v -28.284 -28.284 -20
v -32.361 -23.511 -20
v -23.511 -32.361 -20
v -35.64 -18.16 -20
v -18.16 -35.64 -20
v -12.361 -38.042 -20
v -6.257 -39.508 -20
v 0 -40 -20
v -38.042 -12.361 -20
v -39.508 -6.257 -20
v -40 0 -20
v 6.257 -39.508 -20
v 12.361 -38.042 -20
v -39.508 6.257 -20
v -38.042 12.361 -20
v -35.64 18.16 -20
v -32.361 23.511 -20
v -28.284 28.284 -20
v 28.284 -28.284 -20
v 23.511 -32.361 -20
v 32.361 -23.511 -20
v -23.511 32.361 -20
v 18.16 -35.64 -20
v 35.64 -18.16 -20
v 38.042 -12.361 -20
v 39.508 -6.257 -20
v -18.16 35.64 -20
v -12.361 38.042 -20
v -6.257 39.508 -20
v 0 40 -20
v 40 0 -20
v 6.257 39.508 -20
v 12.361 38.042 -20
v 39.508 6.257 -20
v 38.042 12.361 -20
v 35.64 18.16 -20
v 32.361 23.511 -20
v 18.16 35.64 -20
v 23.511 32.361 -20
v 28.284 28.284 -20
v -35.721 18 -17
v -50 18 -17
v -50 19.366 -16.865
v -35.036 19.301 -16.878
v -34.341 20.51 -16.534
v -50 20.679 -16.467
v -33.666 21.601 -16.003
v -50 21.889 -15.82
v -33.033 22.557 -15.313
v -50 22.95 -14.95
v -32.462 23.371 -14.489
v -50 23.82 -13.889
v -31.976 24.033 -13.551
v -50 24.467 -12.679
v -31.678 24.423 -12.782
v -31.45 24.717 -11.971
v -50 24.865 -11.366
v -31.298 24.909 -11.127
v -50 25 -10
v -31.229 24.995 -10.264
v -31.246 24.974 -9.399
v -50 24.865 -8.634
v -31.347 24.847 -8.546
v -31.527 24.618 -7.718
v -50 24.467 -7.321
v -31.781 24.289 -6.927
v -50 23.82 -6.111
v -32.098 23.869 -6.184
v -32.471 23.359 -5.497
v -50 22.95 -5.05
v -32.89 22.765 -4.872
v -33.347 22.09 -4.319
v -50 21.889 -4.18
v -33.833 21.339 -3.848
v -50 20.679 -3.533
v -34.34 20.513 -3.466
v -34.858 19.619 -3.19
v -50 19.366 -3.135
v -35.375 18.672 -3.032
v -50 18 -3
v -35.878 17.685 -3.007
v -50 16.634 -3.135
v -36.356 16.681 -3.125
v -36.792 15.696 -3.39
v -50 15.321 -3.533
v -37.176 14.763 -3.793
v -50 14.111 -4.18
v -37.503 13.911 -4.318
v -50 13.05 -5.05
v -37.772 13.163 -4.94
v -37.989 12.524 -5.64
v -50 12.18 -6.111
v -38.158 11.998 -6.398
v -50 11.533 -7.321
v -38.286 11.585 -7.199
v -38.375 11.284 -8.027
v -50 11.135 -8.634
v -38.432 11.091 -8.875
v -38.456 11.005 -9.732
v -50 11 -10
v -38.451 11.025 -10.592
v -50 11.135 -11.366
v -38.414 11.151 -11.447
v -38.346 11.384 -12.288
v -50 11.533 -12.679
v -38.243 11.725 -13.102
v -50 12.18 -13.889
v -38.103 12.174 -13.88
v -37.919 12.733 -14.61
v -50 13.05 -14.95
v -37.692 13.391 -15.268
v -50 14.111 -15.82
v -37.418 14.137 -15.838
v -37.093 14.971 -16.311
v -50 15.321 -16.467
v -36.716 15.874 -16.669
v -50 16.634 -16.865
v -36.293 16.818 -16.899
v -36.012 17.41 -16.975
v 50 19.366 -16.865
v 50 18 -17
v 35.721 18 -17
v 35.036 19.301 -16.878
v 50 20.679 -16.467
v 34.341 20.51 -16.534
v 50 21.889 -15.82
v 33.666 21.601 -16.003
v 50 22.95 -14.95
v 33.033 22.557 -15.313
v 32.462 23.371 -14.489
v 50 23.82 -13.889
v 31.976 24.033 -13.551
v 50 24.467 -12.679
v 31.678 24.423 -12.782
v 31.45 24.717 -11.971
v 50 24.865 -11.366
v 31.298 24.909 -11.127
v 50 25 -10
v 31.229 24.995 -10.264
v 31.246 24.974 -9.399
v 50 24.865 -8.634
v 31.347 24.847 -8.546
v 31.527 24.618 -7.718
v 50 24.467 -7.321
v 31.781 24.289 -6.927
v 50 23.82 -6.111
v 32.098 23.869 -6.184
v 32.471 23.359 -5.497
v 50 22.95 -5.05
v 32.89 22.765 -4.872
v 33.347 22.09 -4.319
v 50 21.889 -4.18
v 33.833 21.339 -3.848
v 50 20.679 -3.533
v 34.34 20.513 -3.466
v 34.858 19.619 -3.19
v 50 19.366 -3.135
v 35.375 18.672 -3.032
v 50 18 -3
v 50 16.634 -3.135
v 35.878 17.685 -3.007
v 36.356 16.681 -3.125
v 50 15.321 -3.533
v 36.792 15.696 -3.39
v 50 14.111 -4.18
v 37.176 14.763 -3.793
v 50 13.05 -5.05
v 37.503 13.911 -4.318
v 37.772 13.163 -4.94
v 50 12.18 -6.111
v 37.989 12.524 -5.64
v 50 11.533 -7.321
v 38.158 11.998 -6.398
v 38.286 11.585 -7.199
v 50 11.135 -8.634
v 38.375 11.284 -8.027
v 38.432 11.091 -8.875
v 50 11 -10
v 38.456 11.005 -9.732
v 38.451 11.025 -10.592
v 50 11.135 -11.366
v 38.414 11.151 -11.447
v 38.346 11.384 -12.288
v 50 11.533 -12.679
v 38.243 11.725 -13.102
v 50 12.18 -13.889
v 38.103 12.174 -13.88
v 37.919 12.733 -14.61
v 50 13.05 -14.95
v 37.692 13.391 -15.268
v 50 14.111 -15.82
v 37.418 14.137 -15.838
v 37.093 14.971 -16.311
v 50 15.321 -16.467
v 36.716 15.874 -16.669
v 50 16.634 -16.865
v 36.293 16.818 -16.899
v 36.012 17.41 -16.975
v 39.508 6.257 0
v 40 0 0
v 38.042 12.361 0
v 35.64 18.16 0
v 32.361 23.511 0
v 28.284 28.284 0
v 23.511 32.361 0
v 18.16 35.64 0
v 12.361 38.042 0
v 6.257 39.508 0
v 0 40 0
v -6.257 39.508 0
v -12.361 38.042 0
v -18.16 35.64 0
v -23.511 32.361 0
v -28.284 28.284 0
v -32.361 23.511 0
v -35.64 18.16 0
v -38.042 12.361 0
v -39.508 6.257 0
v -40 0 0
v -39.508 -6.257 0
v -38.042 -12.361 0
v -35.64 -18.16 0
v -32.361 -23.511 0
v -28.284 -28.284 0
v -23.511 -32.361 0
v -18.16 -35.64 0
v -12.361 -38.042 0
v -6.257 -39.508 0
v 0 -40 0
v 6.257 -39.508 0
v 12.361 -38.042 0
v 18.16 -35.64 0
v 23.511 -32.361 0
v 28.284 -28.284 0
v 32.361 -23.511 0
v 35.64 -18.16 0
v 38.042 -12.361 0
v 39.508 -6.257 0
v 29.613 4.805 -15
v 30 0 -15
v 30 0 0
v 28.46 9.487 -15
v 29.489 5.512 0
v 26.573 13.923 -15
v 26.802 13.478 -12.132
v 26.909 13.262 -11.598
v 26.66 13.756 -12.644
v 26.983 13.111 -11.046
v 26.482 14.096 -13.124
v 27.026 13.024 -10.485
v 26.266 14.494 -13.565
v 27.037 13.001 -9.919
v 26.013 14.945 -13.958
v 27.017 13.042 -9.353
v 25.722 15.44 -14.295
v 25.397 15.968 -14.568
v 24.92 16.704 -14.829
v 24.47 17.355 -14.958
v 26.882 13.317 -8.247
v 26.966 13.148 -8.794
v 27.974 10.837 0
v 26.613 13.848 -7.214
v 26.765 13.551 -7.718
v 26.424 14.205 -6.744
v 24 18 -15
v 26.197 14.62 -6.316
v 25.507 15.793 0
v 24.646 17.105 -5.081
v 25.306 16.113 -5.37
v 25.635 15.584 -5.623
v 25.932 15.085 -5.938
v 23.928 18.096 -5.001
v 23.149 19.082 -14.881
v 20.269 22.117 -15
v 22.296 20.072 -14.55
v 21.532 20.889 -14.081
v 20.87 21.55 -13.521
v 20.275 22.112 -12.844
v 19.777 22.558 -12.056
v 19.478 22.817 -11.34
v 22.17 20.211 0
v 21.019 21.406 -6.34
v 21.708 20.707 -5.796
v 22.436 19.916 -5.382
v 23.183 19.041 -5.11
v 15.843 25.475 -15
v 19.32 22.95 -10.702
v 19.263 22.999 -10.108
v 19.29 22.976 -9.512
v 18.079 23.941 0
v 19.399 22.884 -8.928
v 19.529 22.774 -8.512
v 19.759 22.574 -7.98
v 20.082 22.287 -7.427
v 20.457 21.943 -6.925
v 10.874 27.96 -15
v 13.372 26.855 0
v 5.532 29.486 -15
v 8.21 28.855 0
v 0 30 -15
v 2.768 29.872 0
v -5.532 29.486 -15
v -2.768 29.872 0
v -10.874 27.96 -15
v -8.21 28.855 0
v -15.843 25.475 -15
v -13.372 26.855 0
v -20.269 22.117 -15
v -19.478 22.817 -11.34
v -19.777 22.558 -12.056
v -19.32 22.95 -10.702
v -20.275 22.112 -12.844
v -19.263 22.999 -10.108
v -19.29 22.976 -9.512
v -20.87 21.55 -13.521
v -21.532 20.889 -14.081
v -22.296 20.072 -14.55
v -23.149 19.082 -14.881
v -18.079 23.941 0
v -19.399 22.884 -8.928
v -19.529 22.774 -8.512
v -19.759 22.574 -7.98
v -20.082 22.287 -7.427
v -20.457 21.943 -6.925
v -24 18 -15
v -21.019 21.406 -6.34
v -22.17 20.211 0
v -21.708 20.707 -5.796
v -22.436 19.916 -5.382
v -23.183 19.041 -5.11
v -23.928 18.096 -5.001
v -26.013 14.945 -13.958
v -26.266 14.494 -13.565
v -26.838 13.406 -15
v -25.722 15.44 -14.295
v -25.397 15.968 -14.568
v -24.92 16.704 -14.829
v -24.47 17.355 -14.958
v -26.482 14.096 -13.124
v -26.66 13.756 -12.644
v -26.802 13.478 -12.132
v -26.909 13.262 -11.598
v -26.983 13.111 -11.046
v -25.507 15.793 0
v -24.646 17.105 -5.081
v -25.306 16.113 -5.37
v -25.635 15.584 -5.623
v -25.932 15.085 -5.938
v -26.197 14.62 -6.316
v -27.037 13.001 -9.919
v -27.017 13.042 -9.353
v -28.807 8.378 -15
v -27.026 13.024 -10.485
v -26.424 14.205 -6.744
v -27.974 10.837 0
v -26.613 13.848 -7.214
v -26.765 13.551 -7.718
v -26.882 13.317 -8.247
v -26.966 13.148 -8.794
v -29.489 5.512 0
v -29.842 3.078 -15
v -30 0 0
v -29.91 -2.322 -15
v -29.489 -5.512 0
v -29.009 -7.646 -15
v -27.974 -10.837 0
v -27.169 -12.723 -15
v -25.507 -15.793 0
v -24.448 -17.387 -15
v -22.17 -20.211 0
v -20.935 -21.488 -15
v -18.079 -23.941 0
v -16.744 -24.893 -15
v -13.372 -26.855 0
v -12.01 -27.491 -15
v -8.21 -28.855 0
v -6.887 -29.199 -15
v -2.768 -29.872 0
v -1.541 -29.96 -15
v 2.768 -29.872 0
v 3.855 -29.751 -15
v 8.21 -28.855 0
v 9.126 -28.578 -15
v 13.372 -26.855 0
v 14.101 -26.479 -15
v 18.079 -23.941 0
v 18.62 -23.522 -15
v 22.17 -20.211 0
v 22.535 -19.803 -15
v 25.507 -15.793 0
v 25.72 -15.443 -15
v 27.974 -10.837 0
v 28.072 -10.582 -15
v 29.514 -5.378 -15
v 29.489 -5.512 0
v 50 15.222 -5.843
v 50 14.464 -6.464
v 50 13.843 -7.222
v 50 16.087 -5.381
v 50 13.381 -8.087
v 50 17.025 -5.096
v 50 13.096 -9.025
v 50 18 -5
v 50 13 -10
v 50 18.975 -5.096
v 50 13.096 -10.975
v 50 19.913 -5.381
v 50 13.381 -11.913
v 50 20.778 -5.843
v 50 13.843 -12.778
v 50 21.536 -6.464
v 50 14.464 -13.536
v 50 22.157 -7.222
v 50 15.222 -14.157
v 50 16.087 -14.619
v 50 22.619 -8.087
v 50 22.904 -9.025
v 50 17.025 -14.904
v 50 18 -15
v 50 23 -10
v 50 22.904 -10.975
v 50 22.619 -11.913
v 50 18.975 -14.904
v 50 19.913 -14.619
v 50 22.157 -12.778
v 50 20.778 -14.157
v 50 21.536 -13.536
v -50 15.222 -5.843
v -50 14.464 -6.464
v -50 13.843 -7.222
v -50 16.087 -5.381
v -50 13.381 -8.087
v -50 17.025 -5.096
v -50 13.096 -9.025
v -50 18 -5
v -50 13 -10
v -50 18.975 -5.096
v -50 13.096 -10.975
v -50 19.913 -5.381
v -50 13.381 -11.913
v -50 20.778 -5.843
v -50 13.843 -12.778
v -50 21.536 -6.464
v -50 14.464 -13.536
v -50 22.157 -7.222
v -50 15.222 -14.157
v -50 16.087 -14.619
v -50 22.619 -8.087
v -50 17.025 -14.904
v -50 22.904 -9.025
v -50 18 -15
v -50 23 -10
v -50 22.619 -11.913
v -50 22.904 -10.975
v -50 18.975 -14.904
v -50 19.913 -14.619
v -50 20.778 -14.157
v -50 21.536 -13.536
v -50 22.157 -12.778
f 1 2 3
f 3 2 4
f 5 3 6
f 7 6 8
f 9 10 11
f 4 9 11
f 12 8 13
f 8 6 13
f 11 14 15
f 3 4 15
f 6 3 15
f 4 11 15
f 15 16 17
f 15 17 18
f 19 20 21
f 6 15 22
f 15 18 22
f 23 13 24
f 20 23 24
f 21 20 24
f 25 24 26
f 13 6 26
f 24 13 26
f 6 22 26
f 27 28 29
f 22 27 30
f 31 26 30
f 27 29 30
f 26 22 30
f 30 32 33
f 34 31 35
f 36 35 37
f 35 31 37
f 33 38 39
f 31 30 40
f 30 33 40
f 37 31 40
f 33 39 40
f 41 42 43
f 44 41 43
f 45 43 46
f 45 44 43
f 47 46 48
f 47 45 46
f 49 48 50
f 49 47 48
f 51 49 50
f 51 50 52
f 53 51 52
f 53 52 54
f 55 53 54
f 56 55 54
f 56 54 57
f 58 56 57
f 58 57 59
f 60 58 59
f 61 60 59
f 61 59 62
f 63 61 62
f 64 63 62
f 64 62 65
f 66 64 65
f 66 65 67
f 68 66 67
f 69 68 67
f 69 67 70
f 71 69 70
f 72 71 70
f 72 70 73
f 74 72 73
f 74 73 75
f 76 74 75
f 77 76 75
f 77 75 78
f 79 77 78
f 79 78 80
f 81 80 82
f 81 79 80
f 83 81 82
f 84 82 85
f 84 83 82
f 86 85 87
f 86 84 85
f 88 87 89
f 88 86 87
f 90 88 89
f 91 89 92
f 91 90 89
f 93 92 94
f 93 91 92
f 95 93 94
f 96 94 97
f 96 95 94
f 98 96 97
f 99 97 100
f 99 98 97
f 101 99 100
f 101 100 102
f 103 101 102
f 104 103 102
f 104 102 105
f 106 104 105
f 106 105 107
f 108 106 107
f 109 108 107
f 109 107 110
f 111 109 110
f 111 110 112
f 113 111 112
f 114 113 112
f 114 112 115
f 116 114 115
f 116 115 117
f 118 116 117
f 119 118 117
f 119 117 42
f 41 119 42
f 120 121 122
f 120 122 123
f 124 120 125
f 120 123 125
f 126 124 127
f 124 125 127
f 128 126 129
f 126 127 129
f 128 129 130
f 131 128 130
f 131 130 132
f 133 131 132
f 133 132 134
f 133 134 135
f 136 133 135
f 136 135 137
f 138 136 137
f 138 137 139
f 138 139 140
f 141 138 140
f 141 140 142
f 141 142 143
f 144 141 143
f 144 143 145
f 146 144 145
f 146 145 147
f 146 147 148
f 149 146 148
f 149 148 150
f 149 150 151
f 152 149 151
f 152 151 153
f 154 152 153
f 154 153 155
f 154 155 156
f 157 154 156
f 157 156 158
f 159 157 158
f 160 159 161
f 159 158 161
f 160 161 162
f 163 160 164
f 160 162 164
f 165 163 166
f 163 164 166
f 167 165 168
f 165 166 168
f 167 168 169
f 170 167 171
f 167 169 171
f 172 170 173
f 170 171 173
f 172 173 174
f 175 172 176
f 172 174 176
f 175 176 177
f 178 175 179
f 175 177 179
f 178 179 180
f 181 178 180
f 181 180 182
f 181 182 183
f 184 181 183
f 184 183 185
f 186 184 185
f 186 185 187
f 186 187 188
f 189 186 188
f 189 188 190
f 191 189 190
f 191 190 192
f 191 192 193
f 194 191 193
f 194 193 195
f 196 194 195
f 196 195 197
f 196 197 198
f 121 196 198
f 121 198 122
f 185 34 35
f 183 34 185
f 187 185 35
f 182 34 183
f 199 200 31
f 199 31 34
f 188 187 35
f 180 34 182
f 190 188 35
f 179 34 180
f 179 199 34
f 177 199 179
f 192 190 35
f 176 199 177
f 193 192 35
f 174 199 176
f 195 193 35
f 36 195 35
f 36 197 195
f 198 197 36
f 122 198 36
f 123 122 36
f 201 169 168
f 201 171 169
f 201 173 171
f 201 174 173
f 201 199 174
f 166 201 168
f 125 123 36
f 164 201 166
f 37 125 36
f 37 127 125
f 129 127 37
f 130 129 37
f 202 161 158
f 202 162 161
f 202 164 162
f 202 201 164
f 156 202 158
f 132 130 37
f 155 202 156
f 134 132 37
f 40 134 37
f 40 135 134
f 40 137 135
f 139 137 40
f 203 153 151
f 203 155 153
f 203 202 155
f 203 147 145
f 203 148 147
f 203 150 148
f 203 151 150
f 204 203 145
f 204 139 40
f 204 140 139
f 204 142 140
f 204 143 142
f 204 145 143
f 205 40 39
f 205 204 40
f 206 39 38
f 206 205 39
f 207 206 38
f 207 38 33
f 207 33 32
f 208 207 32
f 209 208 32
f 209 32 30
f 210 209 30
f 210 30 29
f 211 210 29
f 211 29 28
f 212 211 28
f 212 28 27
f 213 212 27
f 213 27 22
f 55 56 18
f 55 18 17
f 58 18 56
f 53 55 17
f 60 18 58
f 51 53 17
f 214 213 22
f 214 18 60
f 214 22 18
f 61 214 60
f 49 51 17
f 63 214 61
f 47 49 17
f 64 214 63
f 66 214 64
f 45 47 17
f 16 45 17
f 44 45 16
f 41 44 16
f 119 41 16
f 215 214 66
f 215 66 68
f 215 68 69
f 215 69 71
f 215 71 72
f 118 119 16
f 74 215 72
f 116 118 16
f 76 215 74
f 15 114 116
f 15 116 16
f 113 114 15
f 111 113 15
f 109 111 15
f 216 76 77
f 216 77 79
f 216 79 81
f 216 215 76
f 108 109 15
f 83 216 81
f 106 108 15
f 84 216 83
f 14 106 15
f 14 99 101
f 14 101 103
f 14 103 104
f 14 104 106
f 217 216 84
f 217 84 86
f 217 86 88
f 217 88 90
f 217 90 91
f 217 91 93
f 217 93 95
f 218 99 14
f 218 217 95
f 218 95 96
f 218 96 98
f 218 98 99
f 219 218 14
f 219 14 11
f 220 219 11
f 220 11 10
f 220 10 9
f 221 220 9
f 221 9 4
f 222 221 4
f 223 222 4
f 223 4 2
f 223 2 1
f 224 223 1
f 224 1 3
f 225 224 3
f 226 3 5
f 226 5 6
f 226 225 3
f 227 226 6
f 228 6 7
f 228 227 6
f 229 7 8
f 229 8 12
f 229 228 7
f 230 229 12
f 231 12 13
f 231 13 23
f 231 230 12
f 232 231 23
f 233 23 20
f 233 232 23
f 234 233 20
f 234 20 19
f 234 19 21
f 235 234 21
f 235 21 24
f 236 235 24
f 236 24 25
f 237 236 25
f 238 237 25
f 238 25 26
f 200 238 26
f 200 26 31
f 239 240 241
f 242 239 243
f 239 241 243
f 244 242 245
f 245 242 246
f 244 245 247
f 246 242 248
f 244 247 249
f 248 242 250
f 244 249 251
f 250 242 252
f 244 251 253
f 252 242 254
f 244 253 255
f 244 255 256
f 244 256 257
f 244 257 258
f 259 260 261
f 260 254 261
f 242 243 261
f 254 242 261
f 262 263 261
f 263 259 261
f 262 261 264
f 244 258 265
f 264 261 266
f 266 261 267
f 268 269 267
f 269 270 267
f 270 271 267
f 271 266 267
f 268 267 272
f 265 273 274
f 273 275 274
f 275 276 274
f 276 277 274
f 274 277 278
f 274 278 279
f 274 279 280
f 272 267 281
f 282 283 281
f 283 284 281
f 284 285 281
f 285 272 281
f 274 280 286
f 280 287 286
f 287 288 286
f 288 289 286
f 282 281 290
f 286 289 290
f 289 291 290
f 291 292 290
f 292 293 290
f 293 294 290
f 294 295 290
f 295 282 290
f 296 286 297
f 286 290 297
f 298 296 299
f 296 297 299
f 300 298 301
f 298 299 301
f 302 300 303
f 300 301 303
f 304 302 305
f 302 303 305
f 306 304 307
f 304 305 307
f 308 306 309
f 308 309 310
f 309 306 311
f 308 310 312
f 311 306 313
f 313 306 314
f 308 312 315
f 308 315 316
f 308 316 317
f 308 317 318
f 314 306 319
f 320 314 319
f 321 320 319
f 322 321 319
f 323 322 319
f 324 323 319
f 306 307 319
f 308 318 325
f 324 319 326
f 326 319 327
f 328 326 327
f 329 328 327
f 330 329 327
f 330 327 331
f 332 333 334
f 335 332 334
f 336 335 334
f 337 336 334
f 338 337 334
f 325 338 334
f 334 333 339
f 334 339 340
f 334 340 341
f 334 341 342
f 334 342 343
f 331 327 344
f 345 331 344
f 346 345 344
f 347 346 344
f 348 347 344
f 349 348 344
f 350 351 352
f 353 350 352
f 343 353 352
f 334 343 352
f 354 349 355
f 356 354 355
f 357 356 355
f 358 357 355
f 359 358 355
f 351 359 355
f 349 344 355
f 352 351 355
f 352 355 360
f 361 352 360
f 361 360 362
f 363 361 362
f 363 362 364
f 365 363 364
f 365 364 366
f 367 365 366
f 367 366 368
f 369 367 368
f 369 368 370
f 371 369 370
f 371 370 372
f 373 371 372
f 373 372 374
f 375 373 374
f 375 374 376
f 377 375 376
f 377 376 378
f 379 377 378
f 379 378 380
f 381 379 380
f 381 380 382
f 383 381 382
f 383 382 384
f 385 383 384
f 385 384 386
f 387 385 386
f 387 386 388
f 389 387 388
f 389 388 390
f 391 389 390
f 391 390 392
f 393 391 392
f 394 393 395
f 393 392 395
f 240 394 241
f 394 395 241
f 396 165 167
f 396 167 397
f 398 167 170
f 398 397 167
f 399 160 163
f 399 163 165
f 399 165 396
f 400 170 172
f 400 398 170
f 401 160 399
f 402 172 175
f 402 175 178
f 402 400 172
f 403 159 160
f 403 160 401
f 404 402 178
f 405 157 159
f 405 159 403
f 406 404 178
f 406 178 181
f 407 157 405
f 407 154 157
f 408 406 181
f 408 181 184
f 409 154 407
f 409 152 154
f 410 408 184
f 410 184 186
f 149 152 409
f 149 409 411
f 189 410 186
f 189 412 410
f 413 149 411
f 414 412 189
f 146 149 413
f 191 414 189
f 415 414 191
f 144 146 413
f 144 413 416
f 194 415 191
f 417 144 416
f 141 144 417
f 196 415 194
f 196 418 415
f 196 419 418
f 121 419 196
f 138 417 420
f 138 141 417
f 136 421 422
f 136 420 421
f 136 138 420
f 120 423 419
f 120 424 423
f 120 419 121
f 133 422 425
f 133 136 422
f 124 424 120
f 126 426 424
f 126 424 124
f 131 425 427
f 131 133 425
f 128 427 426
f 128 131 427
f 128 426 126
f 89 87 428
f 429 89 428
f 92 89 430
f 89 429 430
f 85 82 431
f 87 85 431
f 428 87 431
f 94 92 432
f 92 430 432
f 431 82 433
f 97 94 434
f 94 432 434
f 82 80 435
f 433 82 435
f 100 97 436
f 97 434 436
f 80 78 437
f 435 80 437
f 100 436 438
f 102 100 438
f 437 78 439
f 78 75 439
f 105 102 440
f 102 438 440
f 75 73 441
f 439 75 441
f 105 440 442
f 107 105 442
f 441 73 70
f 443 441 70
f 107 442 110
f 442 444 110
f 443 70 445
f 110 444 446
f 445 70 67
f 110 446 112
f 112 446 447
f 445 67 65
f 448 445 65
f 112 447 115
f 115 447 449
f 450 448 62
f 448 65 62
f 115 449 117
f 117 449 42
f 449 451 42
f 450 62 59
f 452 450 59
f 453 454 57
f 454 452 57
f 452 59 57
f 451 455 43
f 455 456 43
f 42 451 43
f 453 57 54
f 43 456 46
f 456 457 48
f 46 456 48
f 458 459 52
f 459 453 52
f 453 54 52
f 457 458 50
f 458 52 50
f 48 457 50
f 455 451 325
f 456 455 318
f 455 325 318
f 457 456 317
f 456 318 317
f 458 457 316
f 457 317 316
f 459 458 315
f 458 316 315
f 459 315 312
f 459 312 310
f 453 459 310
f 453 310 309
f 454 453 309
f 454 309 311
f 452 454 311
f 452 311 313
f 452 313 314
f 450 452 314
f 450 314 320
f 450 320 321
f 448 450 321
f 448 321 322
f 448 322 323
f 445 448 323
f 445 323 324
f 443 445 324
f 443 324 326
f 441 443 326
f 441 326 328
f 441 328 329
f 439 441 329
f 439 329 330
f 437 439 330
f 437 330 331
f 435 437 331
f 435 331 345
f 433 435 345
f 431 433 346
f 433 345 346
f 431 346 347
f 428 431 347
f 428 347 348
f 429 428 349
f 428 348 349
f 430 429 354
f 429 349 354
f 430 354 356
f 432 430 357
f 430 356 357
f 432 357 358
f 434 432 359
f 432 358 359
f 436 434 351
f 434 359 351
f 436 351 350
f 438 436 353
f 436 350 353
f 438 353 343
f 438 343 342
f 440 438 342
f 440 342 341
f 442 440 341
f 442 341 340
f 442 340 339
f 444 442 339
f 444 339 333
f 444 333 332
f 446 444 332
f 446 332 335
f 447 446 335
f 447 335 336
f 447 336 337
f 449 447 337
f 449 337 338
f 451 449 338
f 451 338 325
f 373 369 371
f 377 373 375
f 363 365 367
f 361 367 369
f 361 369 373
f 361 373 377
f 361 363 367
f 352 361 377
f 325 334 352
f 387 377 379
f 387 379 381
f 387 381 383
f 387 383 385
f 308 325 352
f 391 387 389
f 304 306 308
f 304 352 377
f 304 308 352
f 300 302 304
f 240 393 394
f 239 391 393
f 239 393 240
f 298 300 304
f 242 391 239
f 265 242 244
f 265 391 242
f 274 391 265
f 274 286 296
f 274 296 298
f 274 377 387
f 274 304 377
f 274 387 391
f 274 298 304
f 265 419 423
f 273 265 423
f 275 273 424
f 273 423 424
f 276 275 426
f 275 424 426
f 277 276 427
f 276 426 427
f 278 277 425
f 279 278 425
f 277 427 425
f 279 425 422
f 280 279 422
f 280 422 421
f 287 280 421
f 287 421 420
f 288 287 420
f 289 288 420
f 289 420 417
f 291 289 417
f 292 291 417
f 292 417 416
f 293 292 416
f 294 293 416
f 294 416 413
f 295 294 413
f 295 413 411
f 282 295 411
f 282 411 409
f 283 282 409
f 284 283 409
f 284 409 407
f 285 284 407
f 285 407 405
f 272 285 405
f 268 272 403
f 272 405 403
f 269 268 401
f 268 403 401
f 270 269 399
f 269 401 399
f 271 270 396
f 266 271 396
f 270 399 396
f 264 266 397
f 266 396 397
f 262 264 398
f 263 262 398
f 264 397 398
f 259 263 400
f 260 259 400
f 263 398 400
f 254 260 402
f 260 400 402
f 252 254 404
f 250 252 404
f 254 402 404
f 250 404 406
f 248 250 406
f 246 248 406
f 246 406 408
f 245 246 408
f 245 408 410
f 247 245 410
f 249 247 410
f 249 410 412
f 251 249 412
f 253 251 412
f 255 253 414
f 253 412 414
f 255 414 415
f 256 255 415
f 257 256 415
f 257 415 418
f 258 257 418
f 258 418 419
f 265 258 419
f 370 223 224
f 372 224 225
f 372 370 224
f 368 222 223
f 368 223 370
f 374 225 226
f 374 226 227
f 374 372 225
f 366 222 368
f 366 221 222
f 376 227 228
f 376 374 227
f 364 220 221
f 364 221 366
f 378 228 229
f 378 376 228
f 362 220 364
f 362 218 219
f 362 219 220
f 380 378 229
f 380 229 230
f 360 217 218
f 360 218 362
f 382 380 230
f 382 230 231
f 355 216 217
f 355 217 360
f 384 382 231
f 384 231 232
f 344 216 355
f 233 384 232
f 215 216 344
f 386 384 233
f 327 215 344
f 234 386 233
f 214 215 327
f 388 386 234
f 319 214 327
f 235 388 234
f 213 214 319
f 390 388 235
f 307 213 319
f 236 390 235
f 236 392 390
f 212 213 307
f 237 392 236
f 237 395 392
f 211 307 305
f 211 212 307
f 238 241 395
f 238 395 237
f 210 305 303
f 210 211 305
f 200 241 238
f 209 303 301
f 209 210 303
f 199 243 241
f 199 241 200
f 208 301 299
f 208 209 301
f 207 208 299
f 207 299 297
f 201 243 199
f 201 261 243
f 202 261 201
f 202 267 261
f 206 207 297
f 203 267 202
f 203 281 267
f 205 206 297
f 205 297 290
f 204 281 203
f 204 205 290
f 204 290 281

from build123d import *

# Parameters (mm, degrees)
SKETCH1_R                = 40
BOSS_EXTRUDE1_DEPTH      = 20
BOSS_EXTRUDE2_DEPTH      = 50
BOSS_EXTRUDE2_DEPTH_BACK = 50
SKETCH3_R                = 7
SKETCH5_R                = 5
CUT_EXTRUDE2_DEPTH       = 110.544511647
SKETCH2_R                = 30
CUT_EXTRUDE3_DEPTH       = 15


with BuildPart() as part:
    # Sketch1 → Boss-Extrude1 (new body)
    with BuildSketch(Plane.XY):
        Circle(SKETCH1_R)
    extrude(amount=-BOSS_EXTRUDE1_DEPTH)

    # Sketch3 → Boss-Extrude2 (add, two sides: drawn at the far end of the back side and taken through both)
    with BuildSketch(Plane(origin=(0, 0, 0), x_dir=(0, 0, -1), z_dir=(1, 0, 0)).offset(-BOSS_EXTRUDE2_DEPTH_BACK)):
        with Locations((10, 18)):
            Circle(SKETCH3_R)
    extrude(amount=BOSS_EXTRUDE2_DEPTH + BOSS_EXTRUDE2_DEPTH_BACK)

    # Sketch5 → Cut-Extrude2 (cut, through all)
    with BuildSketch(Plane(origin=(50, 0, 0), x_dir=(0, 0, -1), z_dir=(1, 0, 0))):
        with Locations((10, 18)):
            Circle(SKETCH5_R)
    extrude(amount=-CUT_EXTRUDE2_DEPTH, mode=Mode.SUBTRACT)

    # Sketch2 → Cut-Extrude3 (cut)
    with BuildSketch(Plane.XY):
        Circle(SKETCH2_R)
    extrude(amount=-CUT_EXTRUDE3_DEPTH, mode=Mode.SUBTRACT)


solid = part.part
